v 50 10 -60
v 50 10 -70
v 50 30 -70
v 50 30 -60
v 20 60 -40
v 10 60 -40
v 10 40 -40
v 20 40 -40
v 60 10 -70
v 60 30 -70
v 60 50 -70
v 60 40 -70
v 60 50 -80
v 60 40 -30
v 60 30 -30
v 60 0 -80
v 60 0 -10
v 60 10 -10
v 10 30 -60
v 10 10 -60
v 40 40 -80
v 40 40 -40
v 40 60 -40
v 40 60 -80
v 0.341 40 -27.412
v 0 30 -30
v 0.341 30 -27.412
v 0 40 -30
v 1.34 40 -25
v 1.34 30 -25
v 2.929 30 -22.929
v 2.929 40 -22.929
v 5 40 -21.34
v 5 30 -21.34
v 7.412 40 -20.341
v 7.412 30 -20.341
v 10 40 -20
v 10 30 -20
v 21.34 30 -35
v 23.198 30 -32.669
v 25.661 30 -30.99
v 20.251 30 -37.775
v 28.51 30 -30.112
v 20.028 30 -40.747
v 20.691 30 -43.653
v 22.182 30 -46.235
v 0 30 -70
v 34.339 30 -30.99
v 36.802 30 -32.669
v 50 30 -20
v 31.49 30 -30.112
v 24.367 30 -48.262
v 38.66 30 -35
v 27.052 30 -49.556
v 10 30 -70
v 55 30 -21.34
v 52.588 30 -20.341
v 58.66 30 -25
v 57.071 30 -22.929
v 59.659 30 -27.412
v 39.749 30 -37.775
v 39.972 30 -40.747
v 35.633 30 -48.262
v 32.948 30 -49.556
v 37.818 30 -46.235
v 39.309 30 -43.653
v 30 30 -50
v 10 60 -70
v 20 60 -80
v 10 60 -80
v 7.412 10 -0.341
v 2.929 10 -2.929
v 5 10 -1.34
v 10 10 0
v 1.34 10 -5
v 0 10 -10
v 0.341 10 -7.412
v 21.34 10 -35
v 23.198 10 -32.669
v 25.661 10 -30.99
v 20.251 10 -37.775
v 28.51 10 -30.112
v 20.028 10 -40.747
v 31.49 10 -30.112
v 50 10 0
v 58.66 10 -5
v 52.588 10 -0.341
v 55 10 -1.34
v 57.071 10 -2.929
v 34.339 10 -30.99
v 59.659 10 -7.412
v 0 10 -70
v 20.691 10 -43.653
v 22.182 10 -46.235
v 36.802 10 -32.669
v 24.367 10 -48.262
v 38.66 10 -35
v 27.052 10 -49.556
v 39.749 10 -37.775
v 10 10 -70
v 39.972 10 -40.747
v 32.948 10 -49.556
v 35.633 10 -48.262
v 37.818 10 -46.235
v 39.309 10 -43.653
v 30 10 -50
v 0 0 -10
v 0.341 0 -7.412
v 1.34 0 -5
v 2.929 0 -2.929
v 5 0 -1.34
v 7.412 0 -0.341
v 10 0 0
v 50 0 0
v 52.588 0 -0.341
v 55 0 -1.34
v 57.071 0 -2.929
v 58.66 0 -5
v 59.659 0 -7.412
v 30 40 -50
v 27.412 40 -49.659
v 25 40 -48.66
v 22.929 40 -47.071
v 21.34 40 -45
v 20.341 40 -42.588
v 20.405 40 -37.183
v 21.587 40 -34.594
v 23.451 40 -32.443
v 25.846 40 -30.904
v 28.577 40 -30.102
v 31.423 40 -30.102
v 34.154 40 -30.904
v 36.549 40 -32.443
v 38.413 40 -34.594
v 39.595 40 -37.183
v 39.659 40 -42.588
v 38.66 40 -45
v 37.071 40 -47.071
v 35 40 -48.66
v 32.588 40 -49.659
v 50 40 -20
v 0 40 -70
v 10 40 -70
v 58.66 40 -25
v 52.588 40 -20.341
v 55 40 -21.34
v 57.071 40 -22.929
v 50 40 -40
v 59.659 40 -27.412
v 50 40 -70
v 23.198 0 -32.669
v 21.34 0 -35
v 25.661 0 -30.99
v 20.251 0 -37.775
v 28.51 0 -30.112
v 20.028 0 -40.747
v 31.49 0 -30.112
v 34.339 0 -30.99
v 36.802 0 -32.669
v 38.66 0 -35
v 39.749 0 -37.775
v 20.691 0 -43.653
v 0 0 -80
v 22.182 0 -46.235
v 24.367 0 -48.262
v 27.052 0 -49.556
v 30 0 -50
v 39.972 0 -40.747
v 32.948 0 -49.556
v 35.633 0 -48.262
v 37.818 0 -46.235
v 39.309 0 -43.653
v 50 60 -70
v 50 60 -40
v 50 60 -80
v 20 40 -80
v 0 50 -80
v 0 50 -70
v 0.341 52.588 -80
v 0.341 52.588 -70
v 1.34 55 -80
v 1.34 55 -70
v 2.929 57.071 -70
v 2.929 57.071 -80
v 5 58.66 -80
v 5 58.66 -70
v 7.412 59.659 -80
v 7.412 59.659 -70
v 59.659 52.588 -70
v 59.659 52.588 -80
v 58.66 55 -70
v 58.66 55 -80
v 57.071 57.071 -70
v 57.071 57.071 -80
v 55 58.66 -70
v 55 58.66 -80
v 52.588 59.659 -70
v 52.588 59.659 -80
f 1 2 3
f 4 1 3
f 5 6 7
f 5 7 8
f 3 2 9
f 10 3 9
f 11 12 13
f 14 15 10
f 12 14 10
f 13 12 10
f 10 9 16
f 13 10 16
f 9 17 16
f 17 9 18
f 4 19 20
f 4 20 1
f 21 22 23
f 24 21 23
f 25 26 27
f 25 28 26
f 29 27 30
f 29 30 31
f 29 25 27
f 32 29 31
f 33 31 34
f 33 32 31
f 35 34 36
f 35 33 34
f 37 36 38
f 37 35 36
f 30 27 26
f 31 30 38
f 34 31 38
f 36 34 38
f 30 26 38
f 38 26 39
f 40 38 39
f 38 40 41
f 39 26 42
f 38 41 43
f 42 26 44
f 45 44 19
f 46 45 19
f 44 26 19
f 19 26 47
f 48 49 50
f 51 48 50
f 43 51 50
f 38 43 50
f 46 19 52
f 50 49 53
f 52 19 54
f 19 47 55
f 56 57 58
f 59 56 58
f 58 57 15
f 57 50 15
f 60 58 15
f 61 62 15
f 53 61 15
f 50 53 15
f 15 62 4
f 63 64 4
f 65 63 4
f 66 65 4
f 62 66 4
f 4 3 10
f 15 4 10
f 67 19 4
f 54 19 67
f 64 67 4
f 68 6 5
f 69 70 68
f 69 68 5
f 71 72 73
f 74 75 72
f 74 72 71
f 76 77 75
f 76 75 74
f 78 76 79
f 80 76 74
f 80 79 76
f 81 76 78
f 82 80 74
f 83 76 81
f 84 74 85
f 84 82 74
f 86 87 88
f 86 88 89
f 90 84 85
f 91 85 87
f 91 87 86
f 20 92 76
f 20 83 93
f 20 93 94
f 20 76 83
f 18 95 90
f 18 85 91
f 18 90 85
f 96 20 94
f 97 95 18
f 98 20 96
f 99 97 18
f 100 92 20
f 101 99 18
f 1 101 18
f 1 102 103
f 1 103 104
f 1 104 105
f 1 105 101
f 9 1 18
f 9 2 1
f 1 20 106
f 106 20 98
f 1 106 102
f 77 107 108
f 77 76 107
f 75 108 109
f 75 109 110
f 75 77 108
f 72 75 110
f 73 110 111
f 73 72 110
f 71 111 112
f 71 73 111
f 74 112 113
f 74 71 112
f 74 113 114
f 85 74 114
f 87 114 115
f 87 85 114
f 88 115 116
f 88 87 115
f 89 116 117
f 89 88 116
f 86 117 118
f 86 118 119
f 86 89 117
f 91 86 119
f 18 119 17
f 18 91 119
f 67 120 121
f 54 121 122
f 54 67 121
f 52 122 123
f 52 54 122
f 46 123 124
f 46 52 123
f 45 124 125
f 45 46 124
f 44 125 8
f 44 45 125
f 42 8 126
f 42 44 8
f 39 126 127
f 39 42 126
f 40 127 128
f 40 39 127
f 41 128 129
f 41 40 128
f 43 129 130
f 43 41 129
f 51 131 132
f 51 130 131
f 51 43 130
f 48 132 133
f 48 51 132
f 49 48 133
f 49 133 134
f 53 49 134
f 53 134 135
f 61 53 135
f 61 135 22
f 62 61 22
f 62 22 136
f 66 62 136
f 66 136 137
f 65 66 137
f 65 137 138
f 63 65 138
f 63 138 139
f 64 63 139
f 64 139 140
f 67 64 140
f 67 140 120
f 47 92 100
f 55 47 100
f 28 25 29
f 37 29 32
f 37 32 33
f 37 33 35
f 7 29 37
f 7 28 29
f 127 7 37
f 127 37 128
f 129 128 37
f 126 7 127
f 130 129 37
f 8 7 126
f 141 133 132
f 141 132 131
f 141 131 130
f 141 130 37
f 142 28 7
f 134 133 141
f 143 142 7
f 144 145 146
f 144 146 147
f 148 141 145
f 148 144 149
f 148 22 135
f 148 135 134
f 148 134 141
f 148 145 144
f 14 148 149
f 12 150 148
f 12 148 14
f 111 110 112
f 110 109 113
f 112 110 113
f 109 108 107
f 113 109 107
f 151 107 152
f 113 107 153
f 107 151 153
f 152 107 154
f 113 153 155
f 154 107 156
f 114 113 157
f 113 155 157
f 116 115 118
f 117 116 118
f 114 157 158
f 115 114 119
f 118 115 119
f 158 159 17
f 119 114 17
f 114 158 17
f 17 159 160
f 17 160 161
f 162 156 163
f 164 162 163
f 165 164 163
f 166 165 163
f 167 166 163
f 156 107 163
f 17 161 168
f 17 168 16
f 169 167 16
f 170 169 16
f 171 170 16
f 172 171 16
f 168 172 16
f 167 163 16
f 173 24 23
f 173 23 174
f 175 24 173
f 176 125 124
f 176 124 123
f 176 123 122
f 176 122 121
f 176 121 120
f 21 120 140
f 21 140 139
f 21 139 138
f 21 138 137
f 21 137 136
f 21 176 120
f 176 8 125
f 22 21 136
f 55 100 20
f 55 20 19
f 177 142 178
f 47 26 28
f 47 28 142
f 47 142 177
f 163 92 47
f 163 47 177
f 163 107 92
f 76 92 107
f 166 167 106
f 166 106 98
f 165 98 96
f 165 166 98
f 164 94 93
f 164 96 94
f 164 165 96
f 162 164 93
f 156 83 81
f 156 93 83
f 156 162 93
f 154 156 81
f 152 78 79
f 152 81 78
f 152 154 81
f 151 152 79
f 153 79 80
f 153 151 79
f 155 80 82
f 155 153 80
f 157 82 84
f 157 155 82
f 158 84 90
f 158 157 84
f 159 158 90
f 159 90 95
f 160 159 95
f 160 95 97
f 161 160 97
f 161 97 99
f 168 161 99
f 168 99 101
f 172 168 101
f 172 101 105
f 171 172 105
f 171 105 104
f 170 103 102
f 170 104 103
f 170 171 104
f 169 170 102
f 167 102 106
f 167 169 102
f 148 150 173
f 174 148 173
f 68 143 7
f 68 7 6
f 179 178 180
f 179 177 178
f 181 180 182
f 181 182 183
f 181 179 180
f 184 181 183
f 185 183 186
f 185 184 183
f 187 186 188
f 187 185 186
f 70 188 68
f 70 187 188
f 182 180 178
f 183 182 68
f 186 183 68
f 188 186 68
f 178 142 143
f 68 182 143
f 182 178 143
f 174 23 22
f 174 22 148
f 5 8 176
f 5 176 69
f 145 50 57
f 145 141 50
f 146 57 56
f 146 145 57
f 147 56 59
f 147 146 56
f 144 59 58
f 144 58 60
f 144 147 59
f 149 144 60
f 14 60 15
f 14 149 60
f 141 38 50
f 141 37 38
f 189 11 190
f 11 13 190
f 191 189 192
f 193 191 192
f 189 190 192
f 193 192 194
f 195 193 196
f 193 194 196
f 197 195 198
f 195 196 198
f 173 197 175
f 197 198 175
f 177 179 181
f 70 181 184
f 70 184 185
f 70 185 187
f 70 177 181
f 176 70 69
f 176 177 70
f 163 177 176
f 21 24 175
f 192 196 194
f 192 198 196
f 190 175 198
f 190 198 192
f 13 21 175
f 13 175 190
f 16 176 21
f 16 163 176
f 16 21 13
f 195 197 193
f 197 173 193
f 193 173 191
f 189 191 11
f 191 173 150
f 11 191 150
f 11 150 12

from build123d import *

# Parameters (mm, degrees)
SKETCH_1_W               = 60
SKETCH_1_H               = 80
EXTRUDE_1_DEPTH          = 10
SKETCH_2_W               = 60
SKETCH_2_H               = 10
EXTRUDE_2_DEPTH          = 50
SKETCH_3_W               = 60
SKETCH_3_H               = 10
EXTRUDE_3_DEPTH          = 50
SKETCH_4_W               = 40
SKETCH_4_H               = 20
EXTRUDE_4_DEPTH          = 10
SKETCH_5_W               = 40
SKETCH_5_H               = 20
EXTRUDE_5_DEPTH          = 30
SKETCH_6_W               = 20
SKETCH_6_H               = 20
CUT_EXTRUDE_1_DEPTH      = 50
FILLET_1_R               = 10
CUT_EXTRUDE_2_DEPTH      = 50
CUT_EXTRUDE_2_DEPTH_BACK = 50
SKETCH_7_R               = 10


with BuildPart() as part:
    # 스케치1 → 보스-돌출1 (new body)
    with BuildSketch(Plane(origin=(0, 0, 0), x_dir=(1, 0, 0), z_dir=(0, 1, 0))):
        with Locations((30, 40)):
            Rectangle(SKETCH_1_W, SKETCH_1_H)
    extrude(amount=EXTRUDE_1_DEPTH)

    # 스케치2 → 보스-돌출2 (add)
    with BuildSketch(Plane(origin=(0, 10, 0), x_dir=(1, 0, 0), z_dir=(0, 1, 0))):
        with Locations((30, 75)):
            Rectangle(SKETCH_2_W, SKETCH_2_H)
    extrude(amount=EXTRUDE_2_DEPTH)

    # 스케치3 → 보스-돌출3 (add)
    with BuildSketch(Plane.XY.offset(-70)):
        with Locations((30, 35)):
            Rectangle(SKETCH_3_W, SKETCH_3_H)
    extrude(amount=EXTRUDE_3_DEPTH)

    # 스케치4 → 보스-돌출4 (add)
    with BuildSketch(Plane.XY.offset(-70)):
        with Locations((30, 20)):
            Rectangle(SKETCH_4_W, SKETCH_4_H)
    extrude(amount=EXTRUDE_4_DEPTH)

    # 스케치5 → 보스-돌출5 (add)
    with BuildSketch(Plane.XY.offset(-70)):
        with Locations((30, 50)):
            Rectangle(SKETCH_5_W, SKETCH_5_H)
    extrude(amount=EXTRUDE_5_DEPTH)

    # 스케치6 → 컷-돌출1 (cut)
    with BuildSketch(Plane.XY.offset(-40)):
        with Locations((30, 50)):
            Rectangle(SKETCH_6_W, SKETCH_6_H)
    extrude(amount=-CUT_EXTRUDE_1_DEPTH, mode=Mode.SUBTRACT)

    # 필렛1
    fillet_1_edges = [part.edges().sort_by_distance(p)[0] for p in [
        (0, 60, -75),
        (60, 60, -75),
        (0, 35, -20),
        (60, 35, -20),
        (60, 5, 0),
        (0, 5, 0),
    ]]
    fillet(fillet_1_edges, radius=FILLET_1_R)

    # 스케치7 → 컷-돌출2 (cut, two sides: drawn at the far end of the back side and taken through both)
    with BuildSketch(Plane(origin=(0, 10, 0), x_dir=(1, 0, 0), z_dir=(0, 1, 0)).offset(-CUT_EXTRUDE_2_DEPTH_BACK)):
        with Locations(Location((30, 40, 0), (0, 0, 90))):
            Circle(SKETCH_7_R)
    extrude(amount=CUT_EXTRUDE_2_DEPTH + CUT_EXTRUDE_2_DEPTH_BACK, mode=Mode.SUBTRACT)


solid = part.part
